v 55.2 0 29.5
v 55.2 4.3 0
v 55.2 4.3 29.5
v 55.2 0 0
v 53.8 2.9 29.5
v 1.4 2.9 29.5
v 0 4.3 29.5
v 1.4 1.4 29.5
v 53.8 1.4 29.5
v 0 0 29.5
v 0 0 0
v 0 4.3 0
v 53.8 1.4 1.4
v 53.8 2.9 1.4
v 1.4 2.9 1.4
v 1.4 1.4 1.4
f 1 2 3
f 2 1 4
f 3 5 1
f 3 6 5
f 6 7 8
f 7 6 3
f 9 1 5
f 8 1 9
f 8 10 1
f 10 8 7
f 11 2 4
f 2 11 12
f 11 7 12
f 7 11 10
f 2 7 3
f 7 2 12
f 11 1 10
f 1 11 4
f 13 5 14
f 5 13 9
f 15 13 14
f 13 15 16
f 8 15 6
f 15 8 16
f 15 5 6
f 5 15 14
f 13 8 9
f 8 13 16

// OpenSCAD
t=1.4;
to=1;
//Breite Karte
bk=51.4;
//Dicke Karte
dk=0.5;
//Hoehe Karte
hk=84.9;
//Hoehe Cover
hc=bk/2;

module karte()
{
    cube([bk,dk,hk]);
}

//karte();

module aussparung_karte()
{
    cube([bk+to,dk+to,hk]);
}

module cover_karte()
{
     cube([bk+to+t+t, dk+to+t+t, hc+to+t+t]);
}

difference()
{
    cover_karte();
    translate([t,t,t])
    aussparung_karte();
}
